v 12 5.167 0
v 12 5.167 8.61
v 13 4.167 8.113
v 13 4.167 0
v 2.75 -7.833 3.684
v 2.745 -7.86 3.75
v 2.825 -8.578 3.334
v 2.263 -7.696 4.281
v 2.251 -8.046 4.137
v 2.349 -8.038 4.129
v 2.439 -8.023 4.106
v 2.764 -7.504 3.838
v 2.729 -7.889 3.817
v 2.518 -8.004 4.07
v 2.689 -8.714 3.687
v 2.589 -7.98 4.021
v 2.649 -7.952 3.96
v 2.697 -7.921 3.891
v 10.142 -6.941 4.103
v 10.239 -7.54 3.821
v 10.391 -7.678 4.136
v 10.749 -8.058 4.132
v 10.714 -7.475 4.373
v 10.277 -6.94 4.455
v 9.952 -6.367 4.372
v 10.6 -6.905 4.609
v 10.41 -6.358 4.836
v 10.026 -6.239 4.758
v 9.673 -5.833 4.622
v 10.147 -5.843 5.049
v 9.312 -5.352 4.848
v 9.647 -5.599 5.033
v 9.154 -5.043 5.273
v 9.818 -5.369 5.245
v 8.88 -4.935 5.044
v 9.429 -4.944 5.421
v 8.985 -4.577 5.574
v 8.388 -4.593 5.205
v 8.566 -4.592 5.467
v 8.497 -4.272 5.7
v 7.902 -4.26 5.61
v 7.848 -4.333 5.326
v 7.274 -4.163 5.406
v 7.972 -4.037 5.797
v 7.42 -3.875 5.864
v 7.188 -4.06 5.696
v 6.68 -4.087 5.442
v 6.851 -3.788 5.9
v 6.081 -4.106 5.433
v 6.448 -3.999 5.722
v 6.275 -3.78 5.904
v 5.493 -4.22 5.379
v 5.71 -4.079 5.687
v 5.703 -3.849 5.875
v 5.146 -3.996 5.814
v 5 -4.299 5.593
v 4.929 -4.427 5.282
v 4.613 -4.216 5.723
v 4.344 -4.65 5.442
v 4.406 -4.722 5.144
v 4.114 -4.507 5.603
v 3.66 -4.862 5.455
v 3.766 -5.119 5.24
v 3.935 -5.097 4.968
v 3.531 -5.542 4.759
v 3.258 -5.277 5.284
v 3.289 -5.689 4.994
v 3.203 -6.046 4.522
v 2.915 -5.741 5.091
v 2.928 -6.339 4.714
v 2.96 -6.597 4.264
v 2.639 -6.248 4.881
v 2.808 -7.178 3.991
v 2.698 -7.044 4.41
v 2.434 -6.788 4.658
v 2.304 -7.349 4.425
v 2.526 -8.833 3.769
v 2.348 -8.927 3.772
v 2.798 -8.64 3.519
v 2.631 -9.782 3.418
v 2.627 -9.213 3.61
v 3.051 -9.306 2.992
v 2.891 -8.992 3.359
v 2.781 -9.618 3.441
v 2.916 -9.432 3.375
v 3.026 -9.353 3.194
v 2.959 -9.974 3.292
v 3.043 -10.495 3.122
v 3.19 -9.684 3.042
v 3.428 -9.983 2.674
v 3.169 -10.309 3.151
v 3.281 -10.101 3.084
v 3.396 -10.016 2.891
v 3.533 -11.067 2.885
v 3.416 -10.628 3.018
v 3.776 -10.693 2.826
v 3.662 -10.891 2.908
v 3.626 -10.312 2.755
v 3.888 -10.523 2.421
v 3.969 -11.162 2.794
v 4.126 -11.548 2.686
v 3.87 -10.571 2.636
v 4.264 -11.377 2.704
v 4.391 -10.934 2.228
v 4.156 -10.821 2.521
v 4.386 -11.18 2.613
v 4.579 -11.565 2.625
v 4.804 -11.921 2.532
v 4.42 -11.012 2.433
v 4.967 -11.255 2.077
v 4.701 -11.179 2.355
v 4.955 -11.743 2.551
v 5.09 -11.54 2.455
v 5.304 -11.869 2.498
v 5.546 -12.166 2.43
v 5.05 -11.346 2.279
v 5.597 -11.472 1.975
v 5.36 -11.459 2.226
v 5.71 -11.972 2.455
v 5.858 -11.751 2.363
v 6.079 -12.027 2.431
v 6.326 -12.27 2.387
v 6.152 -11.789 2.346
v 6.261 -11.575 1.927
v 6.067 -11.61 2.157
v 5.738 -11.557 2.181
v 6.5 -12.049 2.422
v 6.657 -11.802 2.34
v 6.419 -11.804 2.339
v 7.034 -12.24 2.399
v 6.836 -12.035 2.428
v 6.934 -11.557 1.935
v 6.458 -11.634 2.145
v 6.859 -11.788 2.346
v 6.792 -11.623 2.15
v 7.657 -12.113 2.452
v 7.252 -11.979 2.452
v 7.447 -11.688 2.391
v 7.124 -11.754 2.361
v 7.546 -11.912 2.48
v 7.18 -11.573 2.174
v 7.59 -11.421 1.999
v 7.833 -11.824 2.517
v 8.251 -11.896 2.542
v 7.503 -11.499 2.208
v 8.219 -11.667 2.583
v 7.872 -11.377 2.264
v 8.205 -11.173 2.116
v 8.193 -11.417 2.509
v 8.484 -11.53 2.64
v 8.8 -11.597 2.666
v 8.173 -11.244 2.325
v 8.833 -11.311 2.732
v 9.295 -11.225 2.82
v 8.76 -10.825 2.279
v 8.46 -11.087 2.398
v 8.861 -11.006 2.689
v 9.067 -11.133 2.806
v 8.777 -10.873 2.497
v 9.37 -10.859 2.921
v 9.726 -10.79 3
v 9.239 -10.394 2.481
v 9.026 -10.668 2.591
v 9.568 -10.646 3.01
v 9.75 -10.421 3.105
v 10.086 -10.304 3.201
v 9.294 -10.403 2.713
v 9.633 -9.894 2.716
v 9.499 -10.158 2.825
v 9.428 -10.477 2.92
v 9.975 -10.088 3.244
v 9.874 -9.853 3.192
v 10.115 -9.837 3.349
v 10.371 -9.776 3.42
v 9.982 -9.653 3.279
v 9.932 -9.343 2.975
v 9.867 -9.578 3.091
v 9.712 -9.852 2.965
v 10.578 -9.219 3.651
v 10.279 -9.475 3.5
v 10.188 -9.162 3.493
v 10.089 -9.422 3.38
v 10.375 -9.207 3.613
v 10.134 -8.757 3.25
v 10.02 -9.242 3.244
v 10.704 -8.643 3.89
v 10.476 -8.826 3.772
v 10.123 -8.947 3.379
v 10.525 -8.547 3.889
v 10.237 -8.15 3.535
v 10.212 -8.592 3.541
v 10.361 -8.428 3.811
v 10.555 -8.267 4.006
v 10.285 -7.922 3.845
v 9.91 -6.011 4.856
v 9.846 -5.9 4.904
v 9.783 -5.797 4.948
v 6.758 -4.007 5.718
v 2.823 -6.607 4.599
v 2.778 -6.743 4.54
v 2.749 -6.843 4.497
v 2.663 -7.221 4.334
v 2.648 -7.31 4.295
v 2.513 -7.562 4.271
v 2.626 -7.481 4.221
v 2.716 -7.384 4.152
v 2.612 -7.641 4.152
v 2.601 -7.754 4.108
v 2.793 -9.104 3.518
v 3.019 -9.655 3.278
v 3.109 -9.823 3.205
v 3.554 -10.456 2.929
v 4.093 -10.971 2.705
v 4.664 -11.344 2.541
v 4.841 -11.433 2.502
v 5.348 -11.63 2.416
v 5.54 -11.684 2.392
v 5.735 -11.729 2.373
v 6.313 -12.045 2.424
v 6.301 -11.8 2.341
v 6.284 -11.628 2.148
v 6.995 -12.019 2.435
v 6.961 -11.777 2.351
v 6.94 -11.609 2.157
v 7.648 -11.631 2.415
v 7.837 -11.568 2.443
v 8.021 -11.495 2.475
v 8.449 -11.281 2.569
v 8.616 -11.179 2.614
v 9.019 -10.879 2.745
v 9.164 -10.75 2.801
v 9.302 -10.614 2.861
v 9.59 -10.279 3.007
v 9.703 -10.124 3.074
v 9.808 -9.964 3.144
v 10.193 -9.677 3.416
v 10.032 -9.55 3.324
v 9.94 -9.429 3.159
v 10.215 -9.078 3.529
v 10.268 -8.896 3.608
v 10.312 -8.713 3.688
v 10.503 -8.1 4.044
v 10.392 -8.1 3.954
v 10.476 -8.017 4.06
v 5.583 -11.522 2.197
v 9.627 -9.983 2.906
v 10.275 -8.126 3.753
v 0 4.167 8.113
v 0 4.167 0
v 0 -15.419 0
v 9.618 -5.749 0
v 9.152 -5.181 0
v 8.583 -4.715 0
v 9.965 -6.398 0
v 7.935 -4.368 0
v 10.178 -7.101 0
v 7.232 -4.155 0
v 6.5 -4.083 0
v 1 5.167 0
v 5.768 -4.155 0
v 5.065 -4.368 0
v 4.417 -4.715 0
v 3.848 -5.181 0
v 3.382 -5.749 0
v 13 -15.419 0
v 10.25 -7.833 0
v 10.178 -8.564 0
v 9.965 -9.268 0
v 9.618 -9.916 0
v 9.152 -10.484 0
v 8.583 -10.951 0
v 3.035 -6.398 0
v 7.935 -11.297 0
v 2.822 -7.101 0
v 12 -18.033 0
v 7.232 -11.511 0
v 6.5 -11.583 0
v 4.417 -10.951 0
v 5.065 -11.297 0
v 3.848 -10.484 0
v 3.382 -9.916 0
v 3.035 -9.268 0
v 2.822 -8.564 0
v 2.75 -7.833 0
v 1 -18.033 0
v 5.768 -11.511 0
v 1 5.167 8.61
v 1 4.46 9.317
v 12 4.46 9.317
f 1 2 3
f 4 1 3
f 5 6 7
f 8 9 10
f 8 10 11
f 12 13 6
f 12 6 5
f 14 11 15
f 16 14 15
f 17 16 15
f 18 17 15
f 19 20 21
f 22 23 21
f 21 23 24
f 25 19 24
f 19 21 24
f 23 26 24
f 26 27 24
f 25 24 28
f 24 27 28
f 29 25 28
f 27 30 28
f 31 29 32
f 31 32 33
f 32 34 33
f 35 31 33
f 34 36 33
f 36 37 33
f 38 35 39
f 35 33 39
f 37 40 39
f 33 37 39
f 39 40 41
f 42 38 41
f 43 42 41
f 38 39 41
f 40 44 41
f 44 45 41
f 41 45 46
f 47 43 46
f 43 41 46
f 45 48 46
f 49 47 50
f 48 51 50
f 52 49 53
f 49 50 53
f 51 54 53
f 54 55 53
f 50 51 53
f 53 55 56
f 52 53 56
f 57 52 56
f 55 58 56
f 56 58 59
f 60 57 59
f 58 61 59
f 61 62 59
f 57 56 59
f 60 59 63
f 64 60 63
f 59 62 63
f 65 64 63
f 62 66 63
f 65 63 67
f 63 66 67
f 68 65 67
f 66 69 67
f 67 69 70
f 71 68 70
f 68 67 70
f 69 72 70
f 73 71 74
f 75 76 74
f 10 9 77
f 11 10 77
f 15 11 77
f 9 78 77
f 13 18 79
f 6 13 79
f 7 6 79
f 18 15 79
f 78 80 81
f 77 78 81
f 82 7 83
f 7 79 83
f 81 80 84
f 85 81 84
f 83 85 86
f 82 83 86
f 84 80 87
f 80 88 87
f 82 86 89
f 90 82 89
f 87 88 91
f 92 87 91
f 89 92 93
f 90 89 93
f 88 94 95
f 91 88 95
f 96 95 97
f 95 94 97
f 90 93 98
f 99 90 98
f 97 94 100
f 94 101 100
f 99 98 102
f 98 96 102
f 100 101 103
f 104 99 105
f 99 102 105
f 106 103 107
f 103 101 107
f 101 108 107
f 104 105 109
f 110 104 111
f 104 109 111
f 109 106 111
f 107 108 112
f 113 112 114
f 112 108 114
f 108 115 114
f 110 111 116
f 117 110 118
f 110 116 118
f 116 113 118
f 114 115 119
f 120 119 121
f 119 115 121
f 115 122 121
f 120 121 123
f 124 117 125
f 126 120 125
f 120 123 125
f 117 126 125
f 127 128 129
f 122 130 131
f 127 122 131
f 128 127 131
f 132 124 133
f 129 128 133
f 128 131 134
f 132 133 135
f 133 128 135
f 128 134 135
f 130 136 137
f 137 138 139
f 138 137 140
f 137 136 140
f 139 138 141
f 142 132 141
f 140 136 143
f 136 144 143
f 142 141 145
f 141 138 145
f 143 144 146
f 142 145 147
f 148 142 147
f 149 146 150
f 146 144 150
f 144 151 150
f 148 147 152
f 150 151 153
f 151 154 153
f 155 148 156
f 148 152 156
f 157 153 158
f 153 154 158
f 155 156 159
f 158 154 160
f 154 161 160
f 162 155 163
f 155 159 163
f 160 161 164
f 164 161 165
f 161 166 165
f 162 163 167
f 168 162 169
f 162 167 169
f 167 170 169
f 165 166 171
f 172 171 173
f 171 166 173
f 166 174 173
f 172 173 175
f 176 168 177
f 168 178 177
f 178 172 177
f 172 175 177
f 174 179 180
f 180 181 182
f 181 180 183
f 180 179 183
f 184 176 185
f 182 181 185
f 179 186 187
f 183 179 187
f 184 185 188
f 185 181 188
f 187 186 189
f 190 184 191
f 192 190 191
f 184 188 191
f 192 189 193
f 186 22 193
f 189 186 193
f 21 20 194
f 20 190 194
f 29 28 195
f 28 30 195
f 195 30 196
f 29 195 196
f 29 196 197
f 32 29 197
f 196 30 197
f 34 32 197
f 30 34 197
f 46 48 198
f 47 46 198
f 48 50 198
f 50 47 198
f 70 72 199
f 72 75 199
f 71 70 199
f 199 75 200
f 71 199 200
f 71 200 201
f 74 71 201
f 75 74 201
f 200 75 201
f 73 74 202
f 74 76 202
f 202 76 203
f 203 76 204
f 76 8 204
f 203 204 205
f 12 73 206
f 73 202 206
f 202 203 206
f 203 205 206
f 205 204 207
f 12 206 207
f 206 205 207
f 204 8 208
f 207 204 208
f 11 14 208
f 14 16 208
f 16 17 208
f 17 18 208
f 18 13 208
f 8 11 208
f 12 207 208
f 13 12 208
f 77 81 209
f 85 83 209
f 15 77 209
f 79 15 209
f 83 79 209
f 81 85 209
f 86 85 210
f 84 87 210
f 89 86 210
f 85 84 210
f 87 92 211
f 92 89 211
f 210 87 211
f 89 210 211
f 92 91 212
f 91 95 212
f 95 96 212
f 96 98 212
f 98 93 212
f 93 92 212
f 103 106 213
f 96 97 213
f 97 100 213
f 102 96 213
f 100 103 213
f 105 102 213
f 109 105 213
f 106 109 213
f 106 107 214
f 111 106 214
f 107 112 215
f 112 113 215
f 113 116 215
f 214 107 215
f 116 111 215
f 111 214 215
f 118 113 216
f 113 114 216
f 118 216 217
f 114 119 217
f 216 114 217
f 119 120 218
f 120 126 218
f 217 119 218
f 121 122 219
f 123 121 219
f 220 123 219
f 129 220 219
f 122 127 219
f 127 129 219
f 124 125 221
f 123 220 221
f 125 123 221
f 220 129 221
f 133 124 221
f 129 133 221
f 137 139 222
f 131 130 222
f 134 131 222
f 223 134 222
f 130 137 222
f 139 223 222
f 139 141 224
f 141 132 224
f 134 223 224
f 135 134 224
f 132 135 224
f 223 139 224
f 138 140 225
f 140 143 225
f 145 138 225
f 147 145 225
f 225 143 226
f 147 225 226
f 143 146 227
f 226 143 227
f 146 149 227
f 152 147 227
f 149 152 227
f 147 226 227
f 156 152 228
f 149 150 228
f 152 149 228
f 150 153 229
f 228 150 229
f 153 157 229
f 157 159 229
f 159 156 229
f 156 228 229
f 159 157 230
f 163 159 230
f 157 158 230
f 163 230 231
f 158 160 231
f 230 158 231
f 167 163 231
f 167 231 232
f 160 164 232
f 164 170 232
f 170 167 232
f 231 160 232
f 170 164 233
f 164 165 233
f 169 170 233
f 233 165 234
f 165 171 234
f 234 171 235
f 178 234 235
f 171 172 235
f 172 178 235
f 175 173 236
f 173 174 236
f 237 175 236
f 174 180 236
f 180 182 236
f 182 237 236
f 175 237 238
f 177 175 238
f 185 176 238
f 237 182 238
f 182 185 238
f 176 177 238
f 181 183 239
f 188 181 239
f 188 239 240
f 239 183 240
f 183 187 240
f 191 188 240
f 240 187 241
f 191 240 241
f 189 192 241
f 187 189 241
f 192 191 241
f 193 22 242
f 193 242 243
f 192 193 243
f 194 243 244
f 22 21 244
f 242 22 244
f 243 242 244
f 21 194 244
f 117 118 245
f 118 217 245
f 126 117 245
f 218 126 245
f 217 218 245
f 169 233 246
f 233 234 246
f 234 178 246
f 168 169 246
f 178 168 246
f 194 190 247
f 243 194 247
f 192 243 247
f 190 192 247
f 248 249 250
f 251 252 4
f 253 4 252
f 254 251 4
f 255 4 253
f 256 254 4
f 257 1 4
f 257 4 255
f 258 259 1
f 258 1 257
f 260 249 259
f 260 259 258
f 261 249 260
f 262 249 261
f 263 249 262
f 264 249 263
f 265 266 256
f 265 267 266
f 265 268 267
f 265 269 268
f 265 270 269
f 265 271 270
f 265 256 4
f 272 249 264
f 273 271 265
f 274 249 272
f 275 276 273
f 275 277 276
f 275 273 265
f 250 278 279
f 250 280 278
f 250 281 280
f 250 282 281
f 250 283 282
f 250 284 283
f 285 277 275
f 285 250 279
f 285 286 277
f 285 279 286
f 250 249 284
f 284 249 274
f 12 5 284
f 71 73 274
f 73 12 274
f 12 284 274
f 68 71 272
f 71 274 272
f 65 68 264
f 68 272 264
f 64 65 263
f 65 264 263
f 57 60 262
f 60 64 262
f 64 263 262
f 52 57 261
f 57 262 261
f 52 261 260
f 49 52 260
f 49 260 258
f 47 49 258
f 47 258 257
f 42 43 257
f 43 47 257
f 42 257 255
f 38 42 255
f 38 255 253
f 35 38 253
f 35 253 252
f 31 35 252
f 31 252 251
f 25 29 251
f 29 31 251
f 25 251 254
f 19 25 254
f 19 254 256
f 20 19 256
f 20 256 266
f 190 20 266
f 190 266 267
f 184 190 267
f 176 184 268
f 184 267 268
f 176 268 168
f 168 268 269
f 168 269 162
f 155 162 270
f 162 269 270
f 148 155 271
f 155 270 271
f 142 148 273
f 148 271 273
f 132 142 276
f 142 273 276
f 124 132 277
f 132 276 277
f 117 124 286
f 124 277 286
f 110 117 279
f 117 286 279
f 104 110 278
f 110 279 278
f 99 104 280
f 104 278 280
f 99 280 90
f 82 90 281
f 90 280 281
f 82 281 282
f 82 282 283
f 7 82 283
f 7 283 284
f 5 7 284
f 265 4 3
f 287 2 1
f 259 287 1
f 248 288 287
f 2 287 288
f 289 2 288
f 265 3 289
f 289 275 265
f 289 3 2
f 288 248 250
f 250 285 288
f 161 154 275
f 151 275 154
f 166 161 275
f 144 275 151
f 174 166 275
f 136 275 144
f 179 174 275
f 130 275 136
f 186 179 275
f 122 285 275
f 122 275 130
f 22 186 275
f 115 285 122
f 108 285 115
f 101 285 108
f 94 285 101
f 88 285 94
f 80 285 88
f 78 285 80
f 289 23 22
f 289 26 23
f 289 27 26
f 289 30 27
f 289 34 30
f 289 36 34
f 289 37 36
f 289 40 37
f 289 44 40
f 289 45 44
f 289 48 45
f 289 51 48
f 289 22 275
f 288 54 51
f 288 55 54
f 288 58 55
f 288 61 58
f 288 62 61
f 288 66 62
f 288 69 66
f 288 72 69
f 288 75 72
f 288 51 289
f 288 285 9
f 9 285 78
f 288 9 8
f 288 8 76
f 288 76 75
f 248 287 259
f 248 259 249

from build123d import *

# Parameters (mm, degrees)
RESSALTO_EXTRUS_O1_DEPTH = 13
ESBO_O3_R                = 3.75
CORTE_EXTRUS_O1_DEPTH    = 15
FILETE1_R                = 0.5


with BuildPart() as part:
    # Esboço2 → Ressalto-extrusão1 (new body)
    with BuildSketch(Plane(origin=(0, 0, 0), x_dir=(0, 0, -1), z_dir=(1, 0, 0))):
        Polygon((0, 5.167385512), (0, -18.032614488), (-9.609754647, 5.167385512), align=None)
    extrude(amount=RESSALTO_EXTRUS_O1_DEPTH)

    # Esboço3 → Corte-extrusão1 (cut)
    with BuildSketch(Plane(origin=(0, 0, 0), x_dir=(-1, 0, 0), z_dir=(0, 0, -1))):
        with Locations((-6.5, -7.832614488)):
            Circle(ESBO_O3_R)
    extrude(amount=-CORTE_EXTRUS_O1_DEPTH, mode=Mode.SUBTRACT)

    # Chanfro1
    # the kernel refuses this chamfer: 1, 0.765366865 mm, written as the material it takes off along each edge
    with BuildSketch(Plane(origin=(12.333333333, 4.598349918, 8.679921653), x_dir=(0.6671683756339832, -0.6671683756339838, -0.3313196600080107), z_dir=(0.7268306825413349, 0.4856527354584224, 0.485652735458423))) as chanfro1_piece_1:
        Polygon((-0.578784303, 0.323797402), (0.920087701, 0.323797402), (-0.341303398, -0.647594805), align=None)
    extrude(amount=1.33373176, mode=Mode.SUBTRACT)
    with BuildSketch(Plane(origin=(0.666666667, 4.598349918, 8.679921653), x_dir=(-0.6671683756339831, -0.6671683756339838, -0.3313196600080107), z_dir=(-0.7268306825413349, 0.48565273545842236, 0.485652735458423))) as chanfro1_piece_2:
        Polygon((-0.578784303, -0.323797402), (0.920087701, -0.323797402), (-0.341303398, 0.647594805), align=None)
    extrude(amount=1.33373176, mode=Mode.SUBTRACT)
    with BuildSketch(Plane(origin=(13, 5.167385512, 12.181437635), x_dir=(-0.9996219169112968, 0.02749587661058651, 0), z_dir=(0, 0, -1))) as chanfro1_piece_3:
        with BuildLine():
            Line((1.028673195, 0), (-0.056547155, -1.027117794))
            Line((-0.056547155, -1.027117794), (-0.076539593, -1.026567876))
            ThreePointArc((-0.076539593, -1.026567876), (-0.034129227, -0.51339783), (-0.019992438, 0.000549918))
            Line((-0.019992438, 0.000549918), (0.000549918, 0.019992438))
            ThreePointArc((0.000549918, 0.019992438), (0.514497665, 0.00585565), (1.029223113, 0.019992438))
            Line((1.029223113, 0.019992438), (1.028673195, 0))
        make_face()
    extrude(amount=14.753120623, mode=Mode.SUBTRACT)
    with BuildSketch(Plane(origin=(0, 5.167385512, 12.181437635), x_dir=(0.9996219169112968, 0.027495876610586494, 0), z_dir=(0, 0, -1))) as chanfro1_piece_4:
        with BuildLine():
            Line((1.028673195, 0), (-0.056547155, 1.027117794))
            Line((-0.056547155, 1.027117794), (-0.076539593, 1.026567876))
            ThreePointArc((-0.076539593, 1.026567876), (-0.034129227, 0.51339783), (-0.019992438, -0.000549918))
            Line((-0.019992438, -0.000549918), (0.000549918, -0.019992438))
            ThreePointArc((0.000549918, -0.019992438), (0.514497665, -0.00585565), (1.029223113, -0.019992438))
            Line((1.029223113, -0.019992438), (1.028673195, 0))
        make_face()
    extrude(amount=14.753120623, mode=Mode.SUBTRACT)
    with BuildSketch(Plane(origin=(0, -20.408539765, -0.984140473), x_dir=(-0.027495876610586358, 0.3825387462309866, -0.9235302292840447), z_dir=(0, 0.9238795325112864, 0.3826834323650908))) as chanfro1_piece_5:
        with BuildLine():
            Line((1.028673195, 0), (-0.056547155, -1.027117794))
            Line((-0.056547155, -1.027117794), (-0.076539593, -1.026567876))
            ThreePointArc((-0.076539593, -1.026567876), (-0.034129227, -0.51339783), (-0.019992438, 0.000549918))
            Line((-0.019992438, 0.000549918), (0.000549918, 0.019992438))
            ThreePointArc((0.000549918, 0.019992438), (0.514497665, 0.00585565), (1.029223113, 0.019992438))
            Line((1.029223113, 0.019992438), (1.028673195, 0))
        make_face()
    extrude(amount=30.254865023, mode=Mode.SUBTRACT)
    with BuildSketch(Plane(origin=(13, -20.408539765, -0.984140473), x_dir=(0.027495876610585605, 0.38253874623098666, -0.9235302292840448), z_dir=(0, 0.9238795325112864, 0.3826834323650908))) as chanfro1_piece_6:
        with BuildLine():
            Line((1.028673195, 0), (-0.056547155, 1.027117794))
            Line((-0.056547155, 1.027117794), (-0.076539593, 1.026567876))
            ThreePointArc((-0.076539593, 1.026567876), (-0.034129227, 0.51339783), (-0.019992438, -0.000549918))
            Line((-0.019992438, -0.000549918), (0.000549918, -0.019992438))
            ThreePointArc((0.000549918, -0.019992438), (0.514497665, -0.00585565), (1.029223113, -0.019992438))
            Line((1.029223113, -0.019992438), (1.028673195, 0))
        make_face()
    extrude(amount=30.254865023, mode=Mode.SUBTRACT)
    with BuildSketch(Plane(origin=(-2.571682988, 5.167385512, 9.609754647), x_dir=(0, 0.02749587661058651, -0.9996219169112968), z_dir=(1, 0, 0))) as chanfro1_piece_7:
        with BuildLine():
            Line((1.028673195, 0), (0.244288682, -0.742388668))
            Line((0.244288682, -0.742388668), (0.225607633, -0.749531386))
            ThreePointArc((0.225607633, -0.749531386), (0.120722331, -0.371738041), (-0.018681049, -0.007142717))
            Line((-0.018681049, -0.007142717), (0.000549918, 0.019992438))
            ThreePointArc((0.000549918, 0.019992438), (0.514497665, 0.00585565), (1.029223113, 0.019992438))
            Line((1.029223113, 0.019992438), (1.028673195, 0))
        make_face()
    extrude(amount=18.143365976, mode=Mode.SUBTRACT)

    # Filete1
    filete1_edges = [part.edges().sort_by_distance(p)[0] for p in [
        (10.25, -7.832628458, 4.22497255),
    ]]
    fillet(filete1_edges, radius=FILETE1_R)


solid = part.part
